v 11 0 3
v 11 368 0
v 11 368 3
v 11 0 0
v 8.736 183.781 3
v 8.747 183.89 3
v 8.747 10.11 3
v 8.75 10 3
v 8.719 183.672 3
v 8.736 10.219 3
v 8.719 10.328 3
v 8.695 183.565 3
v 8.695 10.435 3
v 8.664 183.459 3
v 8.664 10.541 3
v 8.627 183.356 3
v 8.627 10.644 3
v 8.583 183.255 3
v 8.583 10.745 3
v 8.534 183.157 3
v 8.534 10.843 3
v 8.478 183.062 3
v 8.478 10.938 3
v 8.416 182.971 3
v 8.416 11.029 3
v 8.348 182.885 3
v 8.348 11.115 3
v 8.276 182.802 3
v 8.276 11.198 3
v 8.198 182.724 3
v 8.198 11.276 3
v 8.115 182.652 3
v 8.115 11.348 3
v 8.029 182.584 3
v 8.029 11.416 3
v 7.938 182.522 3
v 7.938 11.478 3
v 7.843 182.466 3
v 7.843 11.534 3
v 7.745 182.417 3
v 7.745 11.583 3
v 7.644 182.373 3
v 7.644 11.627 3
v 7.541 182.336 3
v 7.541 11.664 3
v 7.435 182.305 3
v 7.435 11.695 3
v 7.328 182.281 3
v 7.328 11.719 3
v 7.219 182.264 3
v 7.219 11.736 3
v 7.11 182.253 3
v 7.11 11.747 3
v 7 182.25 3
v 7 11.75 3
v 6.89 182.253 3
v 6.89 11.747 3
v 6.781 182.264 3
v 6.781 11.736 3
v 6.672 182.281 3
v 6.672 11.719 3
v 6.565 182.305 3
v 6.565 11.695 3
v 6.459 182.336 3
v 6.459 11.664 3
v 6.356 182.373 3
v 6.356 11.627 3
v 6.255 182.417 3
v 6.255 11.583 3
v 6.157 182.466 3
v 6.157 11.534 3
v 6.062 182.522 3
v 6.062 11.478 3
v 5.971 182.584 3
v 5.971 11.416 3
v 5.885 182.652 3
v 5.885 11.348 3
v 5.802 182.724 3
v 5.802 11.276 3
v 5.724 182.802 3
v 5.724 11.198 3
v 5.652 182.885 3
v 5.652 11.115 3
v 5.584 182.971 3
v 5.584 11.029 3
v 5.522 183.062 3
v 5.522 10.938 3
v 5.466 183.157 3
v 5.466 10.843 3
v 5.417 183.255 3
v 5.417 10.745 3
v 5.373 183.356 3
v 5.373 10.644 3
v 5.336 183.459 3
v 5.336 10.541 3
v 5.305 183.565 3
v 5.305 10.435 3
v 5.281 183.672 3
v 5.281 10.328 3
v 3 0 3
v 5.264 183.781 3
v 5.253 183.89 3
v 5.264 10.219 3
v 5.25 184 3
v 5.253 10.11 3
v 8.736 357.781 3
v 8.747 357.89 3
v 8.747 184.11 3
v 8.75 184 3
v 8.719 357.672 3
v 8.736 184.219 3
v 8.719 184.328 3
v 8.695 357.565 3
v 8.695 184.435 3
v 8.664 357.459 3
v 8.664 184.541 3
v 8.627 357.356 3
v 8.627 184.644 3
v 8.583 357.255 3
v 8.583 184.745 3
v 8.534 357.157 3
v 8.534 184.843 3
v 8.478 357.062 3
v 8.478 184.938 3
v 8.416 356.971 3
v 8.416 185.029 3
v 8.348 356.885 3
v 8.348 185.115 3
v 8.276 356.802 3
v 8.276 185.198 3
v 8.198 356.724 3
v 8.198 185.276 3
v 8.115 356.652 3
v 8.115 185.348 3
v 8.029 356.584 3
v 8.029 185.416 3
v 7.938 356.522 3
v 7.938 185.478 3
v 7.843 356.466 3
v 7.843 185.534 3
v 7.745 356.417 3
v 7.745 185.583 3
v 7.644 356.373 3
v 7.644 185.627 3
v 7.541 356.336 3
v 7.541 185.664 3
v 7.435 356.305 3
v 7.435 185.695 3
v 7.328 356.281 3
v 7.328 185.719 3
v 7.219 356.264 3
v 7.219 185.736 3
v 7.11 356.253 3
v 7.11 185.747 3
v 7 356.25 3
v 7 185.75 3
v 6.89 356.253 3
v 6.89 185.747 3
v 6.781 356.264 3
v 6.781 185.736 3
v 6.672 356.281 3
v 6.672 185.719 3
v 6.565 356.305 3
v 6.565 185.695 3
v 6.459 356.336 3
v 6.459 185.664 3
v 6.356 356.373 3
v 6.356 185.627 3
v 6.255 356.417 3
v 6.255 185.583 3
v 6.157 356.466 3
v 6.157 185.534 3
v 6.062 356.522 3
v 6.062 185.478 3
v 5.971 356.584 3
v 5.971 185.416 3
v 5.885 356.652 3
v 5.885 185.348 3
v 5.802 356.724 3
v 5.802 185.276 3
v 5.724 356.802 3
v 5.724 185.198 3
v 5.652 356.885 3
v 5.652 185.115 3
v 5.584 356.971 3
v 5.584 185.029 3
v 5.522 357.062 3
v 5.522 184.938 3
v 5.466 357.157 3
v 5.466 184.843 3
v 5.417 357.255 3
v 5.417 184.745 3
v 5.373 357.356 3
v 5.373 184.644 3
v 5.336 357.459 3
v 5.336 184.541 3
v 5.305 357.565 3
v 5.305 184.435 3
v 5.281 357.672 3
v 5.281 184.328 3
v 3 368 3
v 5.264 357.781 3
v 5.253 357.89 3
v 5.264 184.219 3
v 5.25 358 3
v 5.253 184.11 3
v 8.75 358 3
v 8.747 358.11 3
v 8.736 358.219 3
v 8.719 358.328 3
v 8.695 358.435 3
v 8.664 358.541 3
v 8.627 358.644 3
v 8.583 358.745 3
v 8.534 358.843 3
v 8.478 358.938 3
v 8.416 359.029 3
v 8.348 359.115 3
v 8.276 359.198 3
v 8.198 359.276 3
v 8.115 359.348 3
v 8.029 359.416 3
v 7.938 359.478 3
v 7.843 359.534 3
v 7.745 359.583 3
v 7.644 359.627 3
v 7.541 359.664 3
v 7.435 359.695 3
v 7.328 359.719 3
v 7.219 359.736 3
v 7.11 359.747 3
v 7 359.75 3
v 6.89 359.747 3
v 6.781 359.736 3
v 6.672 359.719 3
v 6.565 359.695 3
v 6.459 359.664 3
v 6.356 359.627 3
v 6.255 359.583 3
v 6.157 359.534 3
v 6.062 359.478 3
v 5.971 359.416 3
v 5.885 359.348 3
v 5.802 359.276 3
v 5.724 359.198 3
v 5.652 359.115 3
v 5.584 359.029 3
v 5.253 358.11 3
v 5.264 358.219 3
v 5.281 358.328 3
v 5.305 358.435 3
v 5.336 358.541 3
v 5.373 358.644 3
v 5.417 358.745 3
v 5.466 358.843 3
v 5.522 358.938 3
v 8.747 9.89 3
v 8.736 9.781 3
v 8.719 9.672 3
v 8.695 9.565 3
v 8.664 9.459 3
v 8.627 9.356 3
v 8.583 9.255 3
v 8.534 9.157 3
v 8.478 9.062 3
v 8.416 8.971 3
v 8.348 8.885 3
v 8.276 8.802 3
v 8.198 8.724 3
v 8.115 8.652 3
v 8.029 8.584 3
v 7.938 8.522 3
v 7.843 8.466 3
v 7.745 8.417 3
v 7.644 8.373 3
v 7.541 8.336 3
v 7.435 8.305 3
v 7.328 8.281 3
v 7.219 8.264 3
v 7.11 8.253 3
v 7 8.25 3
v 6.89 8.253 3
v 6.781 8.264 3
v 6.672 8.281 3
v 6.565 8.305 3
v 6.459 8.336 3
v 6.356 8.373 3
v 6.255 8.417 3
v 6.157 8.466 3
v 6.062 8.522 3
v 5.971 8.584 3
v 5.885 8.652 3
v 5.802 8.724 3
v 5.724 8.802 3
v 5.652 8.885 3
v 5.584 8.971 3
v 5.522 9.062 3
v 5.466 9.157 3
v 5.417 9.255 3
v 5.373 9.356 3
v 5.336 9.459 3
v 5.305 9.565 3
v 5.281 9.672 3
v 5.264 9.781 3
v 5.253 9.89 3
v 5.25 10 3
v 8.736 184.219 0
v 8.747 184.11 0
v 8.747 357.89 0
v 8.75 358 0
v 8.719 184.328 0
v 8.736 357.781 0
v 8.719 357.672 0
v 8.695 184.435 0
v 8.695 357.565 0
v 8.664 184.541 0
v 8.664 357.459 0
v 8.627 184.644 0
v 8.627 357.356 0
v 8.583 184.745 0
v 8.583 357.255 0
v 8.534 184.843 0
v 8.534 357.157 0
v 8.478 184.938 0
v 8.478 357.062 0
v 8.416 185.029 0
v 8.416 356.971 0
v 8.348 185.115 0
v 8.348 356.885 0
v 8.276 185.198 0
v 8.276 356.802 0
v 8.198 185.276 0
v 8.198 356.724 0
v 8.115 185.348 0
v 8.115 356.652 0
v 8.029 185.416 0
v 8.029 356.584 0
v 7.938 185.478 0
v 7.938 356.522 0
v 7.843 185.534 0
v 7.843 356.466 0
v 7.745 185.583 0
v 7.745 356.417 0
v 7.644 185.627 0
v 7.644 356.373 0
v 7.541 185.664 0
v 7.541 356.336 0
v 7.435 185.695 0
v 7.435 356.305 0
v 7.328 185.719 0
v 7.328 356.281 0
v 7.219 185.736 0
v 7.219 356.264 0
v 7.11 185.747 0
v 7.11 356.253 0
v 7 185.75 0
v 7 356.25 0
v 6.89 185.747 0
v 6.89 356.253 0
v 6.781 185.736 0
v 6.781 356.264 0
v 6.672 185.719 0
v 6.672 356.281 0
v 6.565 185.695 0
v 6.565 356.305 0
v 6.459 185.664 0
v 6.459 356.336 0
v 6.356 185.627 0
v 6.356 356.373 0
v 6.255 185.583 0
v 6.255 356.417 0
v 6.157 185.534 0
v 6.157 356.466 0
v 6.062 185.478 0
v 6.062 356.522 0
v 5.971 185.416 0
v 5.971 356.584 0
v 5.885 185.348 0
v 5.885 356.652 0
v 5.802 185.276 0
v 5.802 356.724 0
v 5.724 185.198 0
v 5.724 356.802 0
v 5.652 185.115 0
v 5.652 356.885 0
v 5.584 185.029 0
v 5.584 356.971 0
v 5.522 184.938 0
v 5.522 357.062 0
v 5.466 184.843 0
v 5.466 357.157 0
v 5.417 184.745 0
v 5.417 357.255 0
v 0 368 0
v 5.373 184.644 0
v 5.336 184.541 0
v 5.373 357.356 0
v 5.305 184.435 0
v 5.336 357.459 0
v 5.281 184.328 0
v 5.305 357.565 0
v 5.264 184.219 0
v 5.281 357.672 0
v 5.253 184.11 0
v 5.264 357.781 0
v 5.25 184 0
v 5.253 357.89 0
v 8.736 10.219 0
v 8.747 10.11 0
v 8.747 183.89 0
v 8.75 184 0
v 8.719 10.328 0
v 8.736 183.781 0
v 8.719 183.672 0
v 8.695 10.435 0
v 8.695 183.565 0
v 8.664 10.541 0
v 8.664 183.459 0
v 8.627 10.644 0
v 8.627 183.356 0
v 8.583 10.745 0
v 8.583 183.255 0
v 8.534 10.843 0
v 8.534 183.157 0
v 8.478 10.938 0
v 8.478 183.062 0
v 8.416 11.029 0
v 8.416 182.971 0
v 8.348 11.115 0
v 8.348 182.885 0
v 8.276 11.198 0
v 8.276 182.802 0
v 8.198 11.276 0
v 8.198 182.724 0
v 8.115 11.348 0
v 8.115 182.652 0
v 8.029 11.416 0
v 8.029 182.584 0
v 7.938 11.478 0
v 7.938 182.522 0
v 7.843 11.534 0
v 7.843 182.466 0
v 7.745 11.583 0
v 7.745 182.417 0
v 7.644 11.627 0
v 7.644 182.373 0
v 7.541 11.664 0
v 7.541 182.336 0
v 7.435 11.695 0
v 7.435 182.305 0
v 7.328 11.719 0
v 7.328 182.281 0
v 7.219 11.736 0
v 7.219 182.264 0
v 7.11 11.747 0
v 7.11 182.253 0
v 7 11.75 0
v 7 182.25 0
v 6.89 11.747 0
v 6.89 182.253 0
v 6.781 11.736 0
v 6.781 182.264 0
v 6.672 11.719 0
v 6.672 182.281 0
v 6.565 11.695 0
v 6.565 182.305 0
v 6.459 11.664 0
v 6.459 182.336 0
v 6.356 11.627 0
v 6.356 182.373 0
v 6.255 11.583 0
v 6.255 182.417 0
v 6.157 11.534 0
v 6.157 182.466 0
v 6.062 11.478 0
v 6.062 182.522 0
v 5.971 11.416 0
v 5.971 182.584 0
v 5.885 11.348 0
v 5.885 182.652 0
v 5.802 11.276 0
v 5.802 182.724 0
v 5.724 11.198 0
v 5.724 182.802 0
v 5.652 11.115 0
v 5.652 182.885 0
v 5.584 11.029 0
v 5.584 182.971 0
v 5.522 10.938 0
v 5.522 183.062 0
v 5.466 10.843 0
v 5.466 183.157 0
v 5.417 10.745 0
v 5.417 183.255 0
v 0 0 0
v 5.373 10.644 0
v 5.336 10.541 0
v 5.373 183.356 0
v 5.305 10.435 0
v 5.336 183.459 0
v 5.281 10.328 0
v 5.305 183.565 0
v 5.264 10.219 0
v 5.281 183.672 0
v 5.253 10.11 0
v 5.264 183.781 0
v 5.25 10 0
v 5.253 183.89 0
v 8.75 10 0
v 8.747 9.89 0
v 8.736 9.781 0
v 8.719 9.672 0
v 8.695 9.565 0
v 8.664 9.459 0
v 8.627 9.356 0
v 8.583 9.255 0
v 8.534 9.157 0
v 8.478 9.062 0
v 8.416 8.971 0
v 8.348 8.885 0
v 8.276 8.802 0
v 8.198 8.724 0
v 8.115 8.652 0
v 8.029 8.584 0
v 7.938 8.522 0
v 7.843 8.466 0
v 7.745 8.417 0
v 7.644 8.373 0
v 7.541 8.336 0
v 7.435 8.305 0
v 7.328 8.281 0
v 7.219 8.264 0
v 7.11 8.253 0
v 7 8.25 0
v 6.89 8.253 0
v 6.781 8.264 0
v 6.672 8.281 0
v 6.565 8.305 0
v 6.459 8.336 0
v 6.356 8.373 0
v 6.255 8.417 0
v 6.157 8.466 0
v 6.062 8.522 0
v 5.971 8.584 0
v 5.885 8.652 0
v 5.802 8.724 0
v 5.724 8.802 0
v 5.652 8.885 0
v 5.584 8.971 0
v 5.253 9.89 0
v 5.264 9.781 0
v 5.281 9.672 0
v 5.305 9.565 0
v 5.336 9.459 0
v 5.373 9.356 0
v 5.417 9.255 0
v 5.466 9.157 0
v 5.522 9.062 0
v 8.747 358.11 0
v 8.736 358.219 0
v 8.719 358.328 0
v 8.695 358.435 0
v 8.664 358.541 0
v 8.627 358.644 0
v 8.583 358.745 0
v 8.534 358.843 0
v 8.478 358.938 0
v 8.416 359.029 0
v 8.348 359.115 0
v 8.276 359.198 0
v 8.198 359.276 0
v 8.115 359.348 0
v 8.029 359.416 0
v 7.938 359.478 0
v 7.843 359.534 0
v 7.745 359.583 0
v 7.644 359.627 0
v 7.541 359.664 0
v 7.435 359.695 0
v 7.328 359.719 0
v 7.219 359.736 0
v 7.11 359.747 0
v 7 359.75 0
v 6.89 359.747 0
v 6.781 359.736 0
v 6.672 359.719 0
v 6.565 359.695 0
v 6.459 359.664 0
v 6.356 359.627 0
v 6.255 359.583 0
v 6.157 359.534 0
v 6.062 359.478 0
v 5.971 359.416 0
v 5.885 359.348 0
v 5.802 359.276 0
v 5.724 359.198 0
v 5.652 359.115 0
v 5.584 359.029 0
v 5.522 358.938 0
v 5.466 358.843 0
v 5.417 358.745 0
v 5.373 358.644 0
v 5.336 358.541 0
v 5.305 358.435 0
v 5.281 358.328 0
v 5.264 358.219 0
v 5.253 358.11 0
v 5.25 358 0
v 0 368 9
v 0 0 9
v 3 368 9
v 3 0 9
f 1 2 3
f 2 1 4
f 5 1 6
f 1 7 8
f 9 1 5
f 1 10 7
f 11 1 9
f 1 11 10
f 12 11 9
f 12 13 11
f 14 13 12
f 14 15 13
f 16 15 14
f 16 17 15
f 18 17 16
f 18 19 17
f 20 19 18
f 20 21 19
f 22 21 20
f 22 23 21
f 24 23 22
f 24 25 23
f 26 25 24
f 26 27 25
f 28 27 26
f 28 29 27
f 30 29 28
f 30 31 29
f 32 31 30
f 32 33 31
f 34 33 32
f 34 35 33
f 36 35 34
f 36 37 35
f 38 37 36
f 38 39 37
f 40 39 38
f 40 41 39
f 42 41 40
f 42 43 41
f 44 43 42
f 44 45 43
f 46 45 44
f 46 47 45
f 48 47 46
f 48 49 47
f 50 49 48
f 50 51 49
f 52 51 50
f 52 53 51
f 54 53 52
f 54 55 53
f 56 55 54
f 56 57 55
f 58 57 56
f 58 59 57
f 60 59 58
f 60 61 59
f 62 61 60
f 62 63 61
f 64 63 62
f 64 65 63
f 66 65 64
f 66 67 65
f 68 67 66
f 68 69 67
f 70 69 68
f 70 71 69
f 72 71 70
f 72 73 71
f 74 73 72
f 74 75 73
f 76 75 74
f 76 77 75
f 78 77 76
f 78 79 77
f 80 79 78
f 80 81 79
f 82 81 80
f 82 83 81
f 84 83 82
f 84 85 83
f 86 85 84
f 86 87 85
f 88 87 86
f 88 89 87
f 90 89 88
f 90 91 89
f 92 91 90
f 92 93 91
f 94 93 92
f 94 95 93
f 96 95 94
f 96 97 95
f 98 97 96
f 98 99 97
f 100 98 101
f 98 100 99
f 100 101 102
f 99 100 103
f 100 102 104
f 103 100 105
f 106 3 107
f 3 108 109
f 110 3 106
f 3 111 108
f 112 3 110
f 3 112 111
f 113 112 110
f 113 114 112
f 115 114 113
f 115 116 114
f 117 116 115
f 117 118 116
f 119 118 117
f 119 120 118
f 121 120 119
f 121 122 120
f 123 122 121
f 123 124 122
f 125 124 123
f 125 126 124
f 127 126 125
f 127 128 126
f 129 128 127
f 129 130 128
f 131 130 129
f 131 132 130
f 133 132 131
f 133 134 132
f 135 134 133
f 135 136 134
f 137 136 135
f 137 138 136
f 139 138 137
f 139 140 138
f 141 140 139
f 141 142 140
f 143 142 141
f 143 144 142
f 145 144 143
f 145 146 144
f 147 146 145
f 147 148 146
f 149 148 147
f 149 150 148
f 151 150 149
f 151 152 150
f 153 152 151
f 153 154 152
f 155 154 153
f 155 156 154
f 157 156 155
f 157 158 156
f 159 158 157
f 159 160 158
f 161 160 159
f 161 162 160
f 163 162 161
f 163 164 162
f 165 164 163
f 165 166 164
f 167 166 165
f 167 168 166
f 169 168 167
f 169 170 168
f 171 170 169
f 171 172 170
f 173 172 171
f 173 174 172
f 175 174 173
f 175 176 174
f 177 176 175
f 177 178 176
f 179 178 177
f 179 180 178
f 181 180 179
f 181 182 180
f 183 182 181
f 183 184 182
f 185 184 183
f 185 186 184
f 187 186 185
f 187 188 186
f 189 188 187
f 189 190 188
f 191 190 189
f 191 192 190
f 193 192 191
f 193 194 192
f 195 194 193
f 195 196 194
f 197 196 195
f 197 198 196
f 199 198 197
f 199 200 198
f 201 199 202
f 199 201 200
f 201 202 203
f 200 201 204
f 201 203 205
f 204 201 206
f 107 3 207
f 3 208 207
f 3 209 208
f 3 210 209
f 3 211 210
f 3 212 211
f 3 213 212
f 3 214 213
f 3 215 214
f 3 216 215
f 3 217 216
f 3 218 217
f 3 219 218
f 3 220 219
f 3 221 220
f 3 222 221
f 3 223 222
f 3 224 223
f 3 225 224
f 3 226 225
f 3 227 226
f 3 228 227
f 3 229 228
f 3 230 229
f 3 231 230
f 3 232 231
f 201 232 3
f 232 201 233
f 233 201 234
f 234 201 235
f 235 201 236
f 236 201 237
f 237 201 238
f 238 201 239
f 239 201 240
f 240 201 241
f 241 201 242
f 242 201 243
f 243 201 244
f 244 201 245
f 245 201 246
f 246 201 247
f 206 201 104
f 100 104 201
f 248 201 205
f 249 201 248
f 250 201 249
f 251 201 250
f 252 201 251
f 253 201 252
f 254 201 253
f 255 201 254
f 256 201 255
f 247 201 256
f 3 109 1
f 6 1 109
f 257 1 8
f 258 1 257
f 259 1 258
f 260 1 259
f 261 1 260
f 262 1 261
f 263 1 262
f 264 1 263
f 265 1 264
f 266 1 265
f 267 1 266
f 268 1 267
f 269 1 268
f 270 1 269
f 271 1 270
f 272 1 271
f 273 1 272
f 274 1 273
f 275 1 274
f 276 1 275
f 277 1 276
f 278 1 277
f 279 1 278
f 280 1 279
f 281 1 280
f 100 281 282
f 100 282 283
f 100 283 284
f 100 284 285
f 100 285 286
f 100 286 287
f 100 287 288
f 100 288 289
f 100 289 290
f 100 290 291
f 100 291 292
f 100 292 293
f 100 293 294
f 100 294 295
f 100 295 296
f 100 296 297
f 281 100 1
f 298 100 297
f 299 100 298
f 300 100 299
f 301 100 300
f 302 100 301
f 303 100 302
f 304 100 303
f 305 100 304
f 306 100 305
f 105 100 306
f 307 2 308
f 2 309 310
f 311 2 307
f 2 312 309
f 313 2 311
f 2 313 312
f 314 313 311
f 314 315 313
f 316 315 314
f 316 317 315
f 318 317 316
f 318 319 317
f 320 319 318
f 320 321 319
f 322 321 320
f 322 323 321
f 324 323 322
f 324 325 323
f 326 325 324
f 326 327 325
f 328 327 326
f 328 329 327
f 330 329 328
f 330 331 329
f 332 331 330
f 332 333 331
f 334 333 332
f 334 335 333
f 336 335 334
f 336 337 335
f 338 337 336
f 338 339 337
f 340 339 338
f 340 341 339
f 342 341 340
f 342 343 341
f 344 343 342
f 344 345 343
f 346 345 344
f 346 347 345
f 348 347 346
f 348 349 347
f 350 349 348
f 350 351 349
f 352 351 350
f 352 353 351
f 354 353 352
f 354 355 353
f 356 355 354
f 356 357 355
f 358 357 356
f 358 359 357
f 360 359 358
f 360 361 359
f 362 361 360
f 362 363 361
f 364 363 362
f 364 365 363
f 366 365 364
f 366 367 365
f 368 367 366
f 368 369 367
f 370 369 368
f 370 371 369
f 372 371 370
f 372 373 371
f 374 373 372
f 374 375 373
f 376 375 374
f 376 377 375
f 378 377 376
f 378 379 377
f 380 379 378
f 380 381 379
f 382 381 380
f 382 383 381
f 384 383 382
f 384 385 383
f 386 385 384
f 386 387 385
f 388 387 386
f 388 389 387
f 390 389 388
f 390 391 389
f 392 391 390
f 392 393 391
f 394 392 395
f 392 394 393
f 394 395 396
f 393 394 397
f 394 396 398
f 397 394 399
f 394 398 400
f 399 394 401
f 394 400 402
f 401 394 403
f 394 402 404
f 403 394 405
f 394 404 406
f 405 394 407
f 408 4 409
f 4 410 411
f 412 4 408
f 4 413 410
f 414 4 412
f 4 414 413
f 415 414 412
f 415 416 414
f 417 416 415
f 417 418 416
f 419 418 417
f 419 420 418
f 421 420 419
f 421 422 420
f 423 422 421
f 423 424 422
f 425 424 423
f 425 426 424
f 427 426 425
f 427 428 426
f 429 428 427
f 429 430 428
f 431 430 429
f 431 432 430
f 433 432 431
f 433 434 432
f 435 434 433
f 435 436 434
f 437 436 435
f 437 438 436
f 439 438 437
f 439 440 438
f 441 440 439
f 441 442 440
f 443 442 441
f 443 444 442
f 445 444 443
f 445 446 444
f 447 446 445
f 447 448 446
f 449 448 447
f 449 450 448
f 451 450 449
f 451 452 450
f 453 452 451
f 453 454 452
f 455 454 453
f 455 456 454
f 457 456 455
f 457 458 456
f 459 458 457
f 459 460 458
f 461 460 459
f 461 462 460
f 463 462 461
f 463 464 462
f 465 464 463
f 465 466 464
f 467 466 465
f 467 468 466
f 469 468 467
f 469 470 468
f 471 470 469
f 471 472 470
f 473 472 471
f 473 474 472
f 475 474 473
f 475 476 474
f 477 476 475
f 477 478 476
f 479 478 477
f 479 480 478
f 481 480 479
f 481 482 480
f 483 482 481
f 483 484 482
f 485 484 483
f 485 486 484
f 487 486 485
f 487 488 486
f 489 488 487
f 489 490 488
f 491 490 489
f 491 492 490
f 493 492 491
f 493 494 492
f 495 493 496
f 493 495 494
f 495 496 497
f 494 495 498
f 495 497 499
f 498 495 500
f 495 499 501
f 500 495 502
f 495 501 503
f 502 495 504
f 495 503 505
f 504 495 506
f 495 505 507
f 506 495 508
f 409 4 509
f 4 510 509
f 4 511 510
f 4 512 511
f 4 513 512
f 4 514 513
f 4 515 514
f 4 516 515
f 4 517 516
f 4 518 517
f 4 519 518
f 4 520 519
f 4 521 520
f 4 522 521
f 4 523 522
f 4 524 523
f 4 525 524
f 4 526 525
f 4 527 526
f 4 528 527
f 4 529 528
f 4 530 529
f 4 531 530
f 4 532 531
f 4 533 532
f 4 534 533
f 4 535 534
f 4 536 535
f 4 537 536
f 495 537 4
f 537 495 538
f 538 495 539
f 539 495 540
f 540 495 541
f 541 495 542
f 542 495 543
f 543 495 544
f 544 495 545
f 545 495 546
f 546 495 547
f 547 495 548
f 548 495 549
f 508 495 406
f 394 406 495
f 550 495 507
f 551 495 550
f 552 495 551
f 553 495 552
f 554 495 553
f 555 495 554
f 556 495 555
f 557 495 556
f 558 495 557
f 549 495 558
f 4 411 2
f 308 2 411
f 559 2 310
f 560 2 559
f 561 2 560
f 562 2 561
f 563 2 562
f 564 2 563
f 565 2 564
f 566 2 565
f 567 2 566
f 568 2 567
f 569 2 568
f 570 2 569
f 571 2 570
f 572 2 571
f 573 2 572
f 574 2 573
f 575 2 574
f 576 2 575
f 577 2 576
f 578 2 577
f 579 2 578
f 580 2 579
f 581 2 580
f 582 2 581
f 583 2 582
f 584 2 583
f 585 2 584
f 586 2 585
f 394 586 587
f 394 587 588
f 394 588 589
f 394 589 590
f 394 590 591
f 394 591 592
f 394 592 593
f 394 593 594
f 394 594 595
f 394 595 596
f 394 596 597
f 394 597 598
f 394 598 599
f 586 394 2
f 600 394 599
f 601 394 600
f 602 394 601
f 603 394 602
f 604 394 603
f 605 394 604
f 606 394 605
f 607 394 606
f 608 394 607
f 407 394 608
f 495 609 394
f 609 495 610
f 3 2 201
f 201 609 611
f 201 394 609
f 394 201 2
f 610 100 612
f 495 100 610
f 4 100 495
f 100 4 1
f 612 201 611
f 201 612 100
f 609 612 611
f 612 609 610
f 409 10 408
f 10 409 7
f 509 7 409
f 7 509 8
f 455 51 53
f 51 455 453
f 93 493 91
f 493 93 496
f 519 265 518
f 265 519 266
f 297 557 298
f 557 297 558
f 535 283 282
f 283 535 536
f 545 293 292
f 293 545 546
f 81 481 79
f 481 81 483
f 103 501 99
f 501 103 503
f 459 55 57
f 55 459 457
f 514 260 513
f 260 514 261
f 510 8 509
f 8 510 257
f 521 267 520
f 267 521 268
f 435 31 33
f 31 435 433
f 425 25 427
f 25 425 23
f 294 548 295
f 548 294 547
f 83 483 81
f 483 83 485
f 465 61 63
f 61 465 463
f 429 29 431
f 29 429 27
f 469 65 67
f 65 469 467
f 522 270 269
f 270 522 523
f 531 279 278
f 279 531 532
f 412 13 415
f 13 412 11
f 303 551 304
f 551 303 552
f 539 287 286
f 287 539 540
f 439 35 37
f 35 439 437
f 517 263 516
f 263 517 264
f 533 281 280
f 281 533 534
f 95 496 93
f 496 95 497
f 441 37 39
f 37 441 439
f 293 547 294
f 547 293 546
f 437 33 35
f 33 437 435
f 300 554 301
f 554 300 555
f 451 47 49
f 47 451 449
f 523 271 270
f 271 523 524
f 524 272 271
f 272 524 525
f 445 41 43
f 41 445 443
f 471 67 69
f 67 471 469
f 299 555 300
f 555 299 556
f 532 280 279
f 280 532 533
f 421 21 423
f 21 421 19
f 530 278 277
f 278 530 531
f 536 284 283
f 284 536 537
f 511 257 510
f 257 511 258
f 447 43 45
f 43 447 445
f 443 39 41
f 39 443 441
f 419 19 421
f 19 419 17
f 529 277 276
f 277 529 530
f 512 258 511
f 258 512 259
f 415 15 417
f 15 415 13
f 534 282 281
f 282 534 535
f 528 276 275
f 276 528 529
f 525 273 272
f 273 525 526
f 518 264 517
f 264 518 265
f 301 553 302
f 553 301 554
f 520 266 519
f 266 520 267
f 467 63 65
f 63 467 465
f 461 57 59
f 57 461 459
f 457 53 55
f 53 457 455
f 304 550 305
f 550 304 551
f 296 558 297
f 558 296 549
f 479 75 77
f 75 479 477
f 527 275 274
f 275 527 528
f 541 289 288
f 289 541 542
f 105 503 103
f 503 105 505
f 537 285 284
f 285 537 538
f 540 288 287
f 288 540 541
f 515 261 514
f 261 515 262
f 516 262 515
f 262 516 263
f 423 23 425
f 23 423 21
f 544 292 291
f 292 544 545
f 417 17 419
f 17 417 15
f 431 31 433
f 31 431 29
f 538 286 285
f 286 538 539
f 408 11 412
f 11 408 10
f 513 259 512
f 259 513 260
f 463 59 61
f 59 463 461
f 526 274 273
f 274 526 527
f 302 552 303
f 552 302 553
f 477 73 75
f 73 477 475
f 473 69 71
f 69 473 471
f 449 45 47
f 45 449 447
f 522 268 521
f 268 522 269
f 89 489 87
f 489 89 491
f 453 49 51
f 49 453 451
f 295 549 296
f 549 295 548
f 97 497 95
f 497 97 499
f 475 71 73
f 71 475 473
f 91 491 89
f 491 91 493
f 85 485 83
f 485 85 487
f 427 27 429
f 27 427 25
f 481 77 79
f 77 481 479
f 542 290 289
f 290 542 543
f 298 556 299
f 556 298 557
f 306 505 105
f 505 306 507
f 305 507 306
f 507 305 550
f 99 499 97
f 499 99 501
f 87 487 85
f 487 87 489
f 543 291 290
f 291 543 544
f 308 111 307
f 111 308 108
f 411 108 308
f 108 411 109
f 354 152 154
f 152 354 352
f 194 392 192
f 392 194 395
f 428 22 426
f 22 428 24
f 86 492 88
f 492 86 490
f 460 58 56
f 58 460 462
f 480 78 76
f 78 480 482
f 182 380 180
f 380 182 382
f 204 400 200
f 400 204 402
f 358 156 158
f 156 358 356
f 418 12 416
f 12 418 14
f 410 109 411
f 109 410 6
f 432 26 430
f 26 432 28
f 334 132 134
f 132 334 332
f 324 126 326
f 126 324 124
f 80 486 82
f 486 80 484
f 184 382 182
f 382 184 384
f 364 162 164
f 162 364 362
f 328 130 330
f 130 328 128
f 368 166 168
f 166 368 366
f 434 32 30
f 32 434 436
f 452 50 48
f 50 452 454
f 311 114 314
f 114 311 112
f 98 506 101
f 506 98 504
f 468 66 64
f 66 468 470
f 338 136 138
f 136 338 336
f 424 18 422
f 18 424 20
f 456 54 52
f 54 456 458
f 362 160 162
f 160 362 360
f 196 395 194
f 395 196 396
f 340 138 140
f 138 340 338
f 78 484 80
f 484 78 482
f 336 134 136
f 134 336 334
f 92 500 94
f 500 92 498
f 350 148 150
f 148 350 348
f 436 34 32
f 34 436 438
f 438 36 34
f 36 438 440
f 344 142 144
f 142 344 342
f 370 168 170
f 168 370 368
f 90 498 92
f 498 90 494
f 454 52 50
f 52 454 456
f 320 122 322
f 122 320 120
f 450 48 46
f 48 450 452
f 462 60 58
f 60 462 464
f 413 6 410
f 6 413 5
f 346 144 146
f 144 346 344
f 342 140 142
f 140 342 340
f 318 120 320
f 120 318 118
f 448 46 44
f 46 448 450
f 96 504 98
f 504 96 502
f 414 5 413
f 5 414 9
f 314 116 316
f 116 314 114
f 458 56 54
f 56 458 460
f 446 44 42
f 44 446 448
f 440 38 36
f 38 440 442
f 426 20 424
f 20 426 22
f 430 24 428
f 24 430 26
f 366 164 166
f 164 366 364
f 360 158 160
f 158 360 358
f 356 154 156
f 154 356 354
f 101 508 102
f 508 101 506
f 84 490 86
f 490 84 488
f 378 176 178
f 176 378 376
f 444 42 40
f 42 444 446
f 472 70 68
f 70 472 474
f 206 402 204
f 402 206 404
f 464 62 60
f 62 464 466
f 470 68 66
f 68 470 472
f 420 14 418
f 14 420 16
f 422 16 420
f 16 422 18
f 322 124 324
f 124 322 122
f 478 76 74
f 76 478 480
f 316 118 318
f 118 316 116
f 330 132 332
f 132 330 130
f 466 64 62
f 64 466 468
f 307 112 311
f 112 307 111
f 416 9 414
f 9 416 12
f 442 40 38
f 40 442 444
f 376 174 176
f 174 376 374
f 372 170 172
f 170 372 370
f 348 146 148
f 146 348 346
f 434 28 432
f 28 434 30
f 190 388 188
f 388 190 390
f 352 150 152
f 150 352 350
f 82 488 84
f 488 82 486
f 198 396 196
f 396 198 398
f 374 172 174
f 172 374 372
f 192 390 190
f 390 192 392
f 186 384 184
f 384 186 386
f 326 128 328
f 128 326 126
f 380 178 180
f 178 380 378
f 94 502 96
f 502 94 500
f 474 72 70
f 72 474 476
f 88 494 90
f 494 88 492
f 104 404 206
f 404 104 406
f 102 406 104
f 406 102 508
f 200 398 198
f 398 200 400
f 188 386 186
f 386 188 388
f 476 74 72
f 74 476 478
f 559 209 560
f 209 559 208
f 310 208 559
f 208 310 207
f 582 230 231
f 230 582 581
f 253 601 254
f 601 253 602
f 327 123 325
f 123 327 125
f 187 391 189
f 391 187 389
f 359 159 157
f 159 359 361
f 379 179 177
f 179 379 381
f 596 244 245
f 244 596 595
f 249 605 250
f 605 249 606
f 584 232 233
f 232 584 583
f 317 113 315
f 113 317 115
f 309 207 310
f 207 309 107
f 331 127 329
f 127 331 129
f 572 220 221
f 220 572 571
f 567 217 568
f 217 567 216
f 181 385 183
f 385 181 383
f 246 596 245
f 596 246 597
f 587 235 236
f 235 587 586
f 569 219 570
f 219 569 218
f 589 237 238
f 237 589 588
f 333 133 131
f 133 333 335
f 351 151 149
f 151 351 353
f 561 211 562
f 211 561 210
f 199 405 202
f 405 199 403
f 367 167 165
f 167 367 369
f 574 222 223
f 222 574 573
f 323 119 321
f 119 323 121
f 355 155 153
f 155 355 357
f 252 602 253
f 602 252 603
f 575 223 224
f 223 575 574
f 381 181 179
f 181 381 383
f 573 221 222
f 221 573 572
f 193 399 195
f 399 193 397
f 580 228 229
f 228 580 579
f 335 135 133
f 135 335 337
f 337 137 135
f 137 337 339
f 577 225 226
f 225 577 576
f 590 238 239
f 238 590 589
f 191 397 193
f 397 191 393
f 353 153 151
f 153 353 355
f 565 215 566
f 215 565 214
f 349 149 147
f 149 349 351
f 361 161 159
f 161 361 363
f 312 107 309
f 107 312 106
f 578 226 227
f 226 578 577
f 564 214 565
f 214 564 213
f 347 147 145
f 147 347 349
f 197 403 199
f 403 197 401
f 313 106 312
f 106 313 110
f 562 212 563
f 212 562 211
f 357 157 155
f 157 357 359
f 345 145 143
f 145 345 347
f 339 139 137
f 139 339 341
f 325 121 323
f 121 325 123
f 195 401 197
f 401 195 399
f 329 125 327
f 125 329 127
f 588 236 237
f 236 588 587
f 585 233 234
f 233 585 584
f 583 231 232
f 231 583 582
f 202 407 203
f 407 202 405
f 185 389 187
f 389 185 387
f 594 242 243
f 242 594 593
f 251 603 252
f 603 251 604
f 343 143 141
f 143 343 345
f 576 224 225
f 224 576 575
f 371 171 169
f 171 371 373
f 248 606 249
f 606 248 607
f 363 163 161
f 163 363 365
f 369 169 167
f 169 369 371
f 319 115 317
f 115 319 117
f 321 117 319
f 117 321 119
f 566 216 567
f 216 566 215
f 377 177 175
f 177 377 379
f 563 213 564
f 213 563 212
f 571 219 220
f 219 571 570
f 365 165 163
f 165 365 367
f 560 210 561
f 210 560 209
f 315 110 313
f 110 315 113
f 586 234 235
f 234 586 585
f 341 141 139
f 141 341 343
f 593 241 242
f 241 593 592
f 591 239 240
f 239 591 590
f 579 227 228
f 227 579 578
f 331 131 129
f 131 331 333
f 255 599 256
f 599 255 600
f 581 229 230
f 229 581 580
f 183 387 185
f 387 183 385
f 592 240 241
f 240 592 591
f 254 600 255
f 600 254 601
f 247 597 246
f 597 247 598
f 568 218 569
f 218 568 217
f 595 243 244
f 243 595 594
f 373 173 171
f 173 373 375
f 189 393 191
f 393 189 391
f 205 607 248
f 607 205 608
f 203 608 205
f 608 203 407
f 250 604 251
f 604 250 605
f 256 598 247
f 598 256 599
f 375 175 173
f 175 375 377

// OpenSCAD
//small angle for attaching LEDS
face_a_width  = 11;
face_b_width  = 9;
length = 368;
thickness = 3;
//Hole parameters
holes = true;
hole_diameter = 3.5;
hole_loc_from_end = 10;
angle_rotation = 0;


module make_angle(x,x1,y,z){
    difference()
    {
        union()
        {
            //generate face_a
            cube([x,y,z]);
            //generate face_b
            rotate([0,angle_rotation*-1,0])
            cube([z,y,x1]);
        }
        if (holes)
        {
            translate([((face_a_width-thickness)/2)+ thickness, hole_loc_from_end,-1])
                cylinder(z+2,hole_diameter/2,hole_diameter/2,$fn=100);
            translate([((face_a_width-thickness)/2)+ thickness, length/2,-1])
                cylinder(z+2,hole_diameter/2,hole_diameter/2,$fn=100);
            translate([((face_a_width-thickness)/2)+ thickness, length-hole_loc_from_end,-1])
                cylinder(z+2,hole_diameter/2,hole_diameter/2,$fn=100);
        }    
    }
}

make_angle(face_a_width,face_b_width,length,thickness);
